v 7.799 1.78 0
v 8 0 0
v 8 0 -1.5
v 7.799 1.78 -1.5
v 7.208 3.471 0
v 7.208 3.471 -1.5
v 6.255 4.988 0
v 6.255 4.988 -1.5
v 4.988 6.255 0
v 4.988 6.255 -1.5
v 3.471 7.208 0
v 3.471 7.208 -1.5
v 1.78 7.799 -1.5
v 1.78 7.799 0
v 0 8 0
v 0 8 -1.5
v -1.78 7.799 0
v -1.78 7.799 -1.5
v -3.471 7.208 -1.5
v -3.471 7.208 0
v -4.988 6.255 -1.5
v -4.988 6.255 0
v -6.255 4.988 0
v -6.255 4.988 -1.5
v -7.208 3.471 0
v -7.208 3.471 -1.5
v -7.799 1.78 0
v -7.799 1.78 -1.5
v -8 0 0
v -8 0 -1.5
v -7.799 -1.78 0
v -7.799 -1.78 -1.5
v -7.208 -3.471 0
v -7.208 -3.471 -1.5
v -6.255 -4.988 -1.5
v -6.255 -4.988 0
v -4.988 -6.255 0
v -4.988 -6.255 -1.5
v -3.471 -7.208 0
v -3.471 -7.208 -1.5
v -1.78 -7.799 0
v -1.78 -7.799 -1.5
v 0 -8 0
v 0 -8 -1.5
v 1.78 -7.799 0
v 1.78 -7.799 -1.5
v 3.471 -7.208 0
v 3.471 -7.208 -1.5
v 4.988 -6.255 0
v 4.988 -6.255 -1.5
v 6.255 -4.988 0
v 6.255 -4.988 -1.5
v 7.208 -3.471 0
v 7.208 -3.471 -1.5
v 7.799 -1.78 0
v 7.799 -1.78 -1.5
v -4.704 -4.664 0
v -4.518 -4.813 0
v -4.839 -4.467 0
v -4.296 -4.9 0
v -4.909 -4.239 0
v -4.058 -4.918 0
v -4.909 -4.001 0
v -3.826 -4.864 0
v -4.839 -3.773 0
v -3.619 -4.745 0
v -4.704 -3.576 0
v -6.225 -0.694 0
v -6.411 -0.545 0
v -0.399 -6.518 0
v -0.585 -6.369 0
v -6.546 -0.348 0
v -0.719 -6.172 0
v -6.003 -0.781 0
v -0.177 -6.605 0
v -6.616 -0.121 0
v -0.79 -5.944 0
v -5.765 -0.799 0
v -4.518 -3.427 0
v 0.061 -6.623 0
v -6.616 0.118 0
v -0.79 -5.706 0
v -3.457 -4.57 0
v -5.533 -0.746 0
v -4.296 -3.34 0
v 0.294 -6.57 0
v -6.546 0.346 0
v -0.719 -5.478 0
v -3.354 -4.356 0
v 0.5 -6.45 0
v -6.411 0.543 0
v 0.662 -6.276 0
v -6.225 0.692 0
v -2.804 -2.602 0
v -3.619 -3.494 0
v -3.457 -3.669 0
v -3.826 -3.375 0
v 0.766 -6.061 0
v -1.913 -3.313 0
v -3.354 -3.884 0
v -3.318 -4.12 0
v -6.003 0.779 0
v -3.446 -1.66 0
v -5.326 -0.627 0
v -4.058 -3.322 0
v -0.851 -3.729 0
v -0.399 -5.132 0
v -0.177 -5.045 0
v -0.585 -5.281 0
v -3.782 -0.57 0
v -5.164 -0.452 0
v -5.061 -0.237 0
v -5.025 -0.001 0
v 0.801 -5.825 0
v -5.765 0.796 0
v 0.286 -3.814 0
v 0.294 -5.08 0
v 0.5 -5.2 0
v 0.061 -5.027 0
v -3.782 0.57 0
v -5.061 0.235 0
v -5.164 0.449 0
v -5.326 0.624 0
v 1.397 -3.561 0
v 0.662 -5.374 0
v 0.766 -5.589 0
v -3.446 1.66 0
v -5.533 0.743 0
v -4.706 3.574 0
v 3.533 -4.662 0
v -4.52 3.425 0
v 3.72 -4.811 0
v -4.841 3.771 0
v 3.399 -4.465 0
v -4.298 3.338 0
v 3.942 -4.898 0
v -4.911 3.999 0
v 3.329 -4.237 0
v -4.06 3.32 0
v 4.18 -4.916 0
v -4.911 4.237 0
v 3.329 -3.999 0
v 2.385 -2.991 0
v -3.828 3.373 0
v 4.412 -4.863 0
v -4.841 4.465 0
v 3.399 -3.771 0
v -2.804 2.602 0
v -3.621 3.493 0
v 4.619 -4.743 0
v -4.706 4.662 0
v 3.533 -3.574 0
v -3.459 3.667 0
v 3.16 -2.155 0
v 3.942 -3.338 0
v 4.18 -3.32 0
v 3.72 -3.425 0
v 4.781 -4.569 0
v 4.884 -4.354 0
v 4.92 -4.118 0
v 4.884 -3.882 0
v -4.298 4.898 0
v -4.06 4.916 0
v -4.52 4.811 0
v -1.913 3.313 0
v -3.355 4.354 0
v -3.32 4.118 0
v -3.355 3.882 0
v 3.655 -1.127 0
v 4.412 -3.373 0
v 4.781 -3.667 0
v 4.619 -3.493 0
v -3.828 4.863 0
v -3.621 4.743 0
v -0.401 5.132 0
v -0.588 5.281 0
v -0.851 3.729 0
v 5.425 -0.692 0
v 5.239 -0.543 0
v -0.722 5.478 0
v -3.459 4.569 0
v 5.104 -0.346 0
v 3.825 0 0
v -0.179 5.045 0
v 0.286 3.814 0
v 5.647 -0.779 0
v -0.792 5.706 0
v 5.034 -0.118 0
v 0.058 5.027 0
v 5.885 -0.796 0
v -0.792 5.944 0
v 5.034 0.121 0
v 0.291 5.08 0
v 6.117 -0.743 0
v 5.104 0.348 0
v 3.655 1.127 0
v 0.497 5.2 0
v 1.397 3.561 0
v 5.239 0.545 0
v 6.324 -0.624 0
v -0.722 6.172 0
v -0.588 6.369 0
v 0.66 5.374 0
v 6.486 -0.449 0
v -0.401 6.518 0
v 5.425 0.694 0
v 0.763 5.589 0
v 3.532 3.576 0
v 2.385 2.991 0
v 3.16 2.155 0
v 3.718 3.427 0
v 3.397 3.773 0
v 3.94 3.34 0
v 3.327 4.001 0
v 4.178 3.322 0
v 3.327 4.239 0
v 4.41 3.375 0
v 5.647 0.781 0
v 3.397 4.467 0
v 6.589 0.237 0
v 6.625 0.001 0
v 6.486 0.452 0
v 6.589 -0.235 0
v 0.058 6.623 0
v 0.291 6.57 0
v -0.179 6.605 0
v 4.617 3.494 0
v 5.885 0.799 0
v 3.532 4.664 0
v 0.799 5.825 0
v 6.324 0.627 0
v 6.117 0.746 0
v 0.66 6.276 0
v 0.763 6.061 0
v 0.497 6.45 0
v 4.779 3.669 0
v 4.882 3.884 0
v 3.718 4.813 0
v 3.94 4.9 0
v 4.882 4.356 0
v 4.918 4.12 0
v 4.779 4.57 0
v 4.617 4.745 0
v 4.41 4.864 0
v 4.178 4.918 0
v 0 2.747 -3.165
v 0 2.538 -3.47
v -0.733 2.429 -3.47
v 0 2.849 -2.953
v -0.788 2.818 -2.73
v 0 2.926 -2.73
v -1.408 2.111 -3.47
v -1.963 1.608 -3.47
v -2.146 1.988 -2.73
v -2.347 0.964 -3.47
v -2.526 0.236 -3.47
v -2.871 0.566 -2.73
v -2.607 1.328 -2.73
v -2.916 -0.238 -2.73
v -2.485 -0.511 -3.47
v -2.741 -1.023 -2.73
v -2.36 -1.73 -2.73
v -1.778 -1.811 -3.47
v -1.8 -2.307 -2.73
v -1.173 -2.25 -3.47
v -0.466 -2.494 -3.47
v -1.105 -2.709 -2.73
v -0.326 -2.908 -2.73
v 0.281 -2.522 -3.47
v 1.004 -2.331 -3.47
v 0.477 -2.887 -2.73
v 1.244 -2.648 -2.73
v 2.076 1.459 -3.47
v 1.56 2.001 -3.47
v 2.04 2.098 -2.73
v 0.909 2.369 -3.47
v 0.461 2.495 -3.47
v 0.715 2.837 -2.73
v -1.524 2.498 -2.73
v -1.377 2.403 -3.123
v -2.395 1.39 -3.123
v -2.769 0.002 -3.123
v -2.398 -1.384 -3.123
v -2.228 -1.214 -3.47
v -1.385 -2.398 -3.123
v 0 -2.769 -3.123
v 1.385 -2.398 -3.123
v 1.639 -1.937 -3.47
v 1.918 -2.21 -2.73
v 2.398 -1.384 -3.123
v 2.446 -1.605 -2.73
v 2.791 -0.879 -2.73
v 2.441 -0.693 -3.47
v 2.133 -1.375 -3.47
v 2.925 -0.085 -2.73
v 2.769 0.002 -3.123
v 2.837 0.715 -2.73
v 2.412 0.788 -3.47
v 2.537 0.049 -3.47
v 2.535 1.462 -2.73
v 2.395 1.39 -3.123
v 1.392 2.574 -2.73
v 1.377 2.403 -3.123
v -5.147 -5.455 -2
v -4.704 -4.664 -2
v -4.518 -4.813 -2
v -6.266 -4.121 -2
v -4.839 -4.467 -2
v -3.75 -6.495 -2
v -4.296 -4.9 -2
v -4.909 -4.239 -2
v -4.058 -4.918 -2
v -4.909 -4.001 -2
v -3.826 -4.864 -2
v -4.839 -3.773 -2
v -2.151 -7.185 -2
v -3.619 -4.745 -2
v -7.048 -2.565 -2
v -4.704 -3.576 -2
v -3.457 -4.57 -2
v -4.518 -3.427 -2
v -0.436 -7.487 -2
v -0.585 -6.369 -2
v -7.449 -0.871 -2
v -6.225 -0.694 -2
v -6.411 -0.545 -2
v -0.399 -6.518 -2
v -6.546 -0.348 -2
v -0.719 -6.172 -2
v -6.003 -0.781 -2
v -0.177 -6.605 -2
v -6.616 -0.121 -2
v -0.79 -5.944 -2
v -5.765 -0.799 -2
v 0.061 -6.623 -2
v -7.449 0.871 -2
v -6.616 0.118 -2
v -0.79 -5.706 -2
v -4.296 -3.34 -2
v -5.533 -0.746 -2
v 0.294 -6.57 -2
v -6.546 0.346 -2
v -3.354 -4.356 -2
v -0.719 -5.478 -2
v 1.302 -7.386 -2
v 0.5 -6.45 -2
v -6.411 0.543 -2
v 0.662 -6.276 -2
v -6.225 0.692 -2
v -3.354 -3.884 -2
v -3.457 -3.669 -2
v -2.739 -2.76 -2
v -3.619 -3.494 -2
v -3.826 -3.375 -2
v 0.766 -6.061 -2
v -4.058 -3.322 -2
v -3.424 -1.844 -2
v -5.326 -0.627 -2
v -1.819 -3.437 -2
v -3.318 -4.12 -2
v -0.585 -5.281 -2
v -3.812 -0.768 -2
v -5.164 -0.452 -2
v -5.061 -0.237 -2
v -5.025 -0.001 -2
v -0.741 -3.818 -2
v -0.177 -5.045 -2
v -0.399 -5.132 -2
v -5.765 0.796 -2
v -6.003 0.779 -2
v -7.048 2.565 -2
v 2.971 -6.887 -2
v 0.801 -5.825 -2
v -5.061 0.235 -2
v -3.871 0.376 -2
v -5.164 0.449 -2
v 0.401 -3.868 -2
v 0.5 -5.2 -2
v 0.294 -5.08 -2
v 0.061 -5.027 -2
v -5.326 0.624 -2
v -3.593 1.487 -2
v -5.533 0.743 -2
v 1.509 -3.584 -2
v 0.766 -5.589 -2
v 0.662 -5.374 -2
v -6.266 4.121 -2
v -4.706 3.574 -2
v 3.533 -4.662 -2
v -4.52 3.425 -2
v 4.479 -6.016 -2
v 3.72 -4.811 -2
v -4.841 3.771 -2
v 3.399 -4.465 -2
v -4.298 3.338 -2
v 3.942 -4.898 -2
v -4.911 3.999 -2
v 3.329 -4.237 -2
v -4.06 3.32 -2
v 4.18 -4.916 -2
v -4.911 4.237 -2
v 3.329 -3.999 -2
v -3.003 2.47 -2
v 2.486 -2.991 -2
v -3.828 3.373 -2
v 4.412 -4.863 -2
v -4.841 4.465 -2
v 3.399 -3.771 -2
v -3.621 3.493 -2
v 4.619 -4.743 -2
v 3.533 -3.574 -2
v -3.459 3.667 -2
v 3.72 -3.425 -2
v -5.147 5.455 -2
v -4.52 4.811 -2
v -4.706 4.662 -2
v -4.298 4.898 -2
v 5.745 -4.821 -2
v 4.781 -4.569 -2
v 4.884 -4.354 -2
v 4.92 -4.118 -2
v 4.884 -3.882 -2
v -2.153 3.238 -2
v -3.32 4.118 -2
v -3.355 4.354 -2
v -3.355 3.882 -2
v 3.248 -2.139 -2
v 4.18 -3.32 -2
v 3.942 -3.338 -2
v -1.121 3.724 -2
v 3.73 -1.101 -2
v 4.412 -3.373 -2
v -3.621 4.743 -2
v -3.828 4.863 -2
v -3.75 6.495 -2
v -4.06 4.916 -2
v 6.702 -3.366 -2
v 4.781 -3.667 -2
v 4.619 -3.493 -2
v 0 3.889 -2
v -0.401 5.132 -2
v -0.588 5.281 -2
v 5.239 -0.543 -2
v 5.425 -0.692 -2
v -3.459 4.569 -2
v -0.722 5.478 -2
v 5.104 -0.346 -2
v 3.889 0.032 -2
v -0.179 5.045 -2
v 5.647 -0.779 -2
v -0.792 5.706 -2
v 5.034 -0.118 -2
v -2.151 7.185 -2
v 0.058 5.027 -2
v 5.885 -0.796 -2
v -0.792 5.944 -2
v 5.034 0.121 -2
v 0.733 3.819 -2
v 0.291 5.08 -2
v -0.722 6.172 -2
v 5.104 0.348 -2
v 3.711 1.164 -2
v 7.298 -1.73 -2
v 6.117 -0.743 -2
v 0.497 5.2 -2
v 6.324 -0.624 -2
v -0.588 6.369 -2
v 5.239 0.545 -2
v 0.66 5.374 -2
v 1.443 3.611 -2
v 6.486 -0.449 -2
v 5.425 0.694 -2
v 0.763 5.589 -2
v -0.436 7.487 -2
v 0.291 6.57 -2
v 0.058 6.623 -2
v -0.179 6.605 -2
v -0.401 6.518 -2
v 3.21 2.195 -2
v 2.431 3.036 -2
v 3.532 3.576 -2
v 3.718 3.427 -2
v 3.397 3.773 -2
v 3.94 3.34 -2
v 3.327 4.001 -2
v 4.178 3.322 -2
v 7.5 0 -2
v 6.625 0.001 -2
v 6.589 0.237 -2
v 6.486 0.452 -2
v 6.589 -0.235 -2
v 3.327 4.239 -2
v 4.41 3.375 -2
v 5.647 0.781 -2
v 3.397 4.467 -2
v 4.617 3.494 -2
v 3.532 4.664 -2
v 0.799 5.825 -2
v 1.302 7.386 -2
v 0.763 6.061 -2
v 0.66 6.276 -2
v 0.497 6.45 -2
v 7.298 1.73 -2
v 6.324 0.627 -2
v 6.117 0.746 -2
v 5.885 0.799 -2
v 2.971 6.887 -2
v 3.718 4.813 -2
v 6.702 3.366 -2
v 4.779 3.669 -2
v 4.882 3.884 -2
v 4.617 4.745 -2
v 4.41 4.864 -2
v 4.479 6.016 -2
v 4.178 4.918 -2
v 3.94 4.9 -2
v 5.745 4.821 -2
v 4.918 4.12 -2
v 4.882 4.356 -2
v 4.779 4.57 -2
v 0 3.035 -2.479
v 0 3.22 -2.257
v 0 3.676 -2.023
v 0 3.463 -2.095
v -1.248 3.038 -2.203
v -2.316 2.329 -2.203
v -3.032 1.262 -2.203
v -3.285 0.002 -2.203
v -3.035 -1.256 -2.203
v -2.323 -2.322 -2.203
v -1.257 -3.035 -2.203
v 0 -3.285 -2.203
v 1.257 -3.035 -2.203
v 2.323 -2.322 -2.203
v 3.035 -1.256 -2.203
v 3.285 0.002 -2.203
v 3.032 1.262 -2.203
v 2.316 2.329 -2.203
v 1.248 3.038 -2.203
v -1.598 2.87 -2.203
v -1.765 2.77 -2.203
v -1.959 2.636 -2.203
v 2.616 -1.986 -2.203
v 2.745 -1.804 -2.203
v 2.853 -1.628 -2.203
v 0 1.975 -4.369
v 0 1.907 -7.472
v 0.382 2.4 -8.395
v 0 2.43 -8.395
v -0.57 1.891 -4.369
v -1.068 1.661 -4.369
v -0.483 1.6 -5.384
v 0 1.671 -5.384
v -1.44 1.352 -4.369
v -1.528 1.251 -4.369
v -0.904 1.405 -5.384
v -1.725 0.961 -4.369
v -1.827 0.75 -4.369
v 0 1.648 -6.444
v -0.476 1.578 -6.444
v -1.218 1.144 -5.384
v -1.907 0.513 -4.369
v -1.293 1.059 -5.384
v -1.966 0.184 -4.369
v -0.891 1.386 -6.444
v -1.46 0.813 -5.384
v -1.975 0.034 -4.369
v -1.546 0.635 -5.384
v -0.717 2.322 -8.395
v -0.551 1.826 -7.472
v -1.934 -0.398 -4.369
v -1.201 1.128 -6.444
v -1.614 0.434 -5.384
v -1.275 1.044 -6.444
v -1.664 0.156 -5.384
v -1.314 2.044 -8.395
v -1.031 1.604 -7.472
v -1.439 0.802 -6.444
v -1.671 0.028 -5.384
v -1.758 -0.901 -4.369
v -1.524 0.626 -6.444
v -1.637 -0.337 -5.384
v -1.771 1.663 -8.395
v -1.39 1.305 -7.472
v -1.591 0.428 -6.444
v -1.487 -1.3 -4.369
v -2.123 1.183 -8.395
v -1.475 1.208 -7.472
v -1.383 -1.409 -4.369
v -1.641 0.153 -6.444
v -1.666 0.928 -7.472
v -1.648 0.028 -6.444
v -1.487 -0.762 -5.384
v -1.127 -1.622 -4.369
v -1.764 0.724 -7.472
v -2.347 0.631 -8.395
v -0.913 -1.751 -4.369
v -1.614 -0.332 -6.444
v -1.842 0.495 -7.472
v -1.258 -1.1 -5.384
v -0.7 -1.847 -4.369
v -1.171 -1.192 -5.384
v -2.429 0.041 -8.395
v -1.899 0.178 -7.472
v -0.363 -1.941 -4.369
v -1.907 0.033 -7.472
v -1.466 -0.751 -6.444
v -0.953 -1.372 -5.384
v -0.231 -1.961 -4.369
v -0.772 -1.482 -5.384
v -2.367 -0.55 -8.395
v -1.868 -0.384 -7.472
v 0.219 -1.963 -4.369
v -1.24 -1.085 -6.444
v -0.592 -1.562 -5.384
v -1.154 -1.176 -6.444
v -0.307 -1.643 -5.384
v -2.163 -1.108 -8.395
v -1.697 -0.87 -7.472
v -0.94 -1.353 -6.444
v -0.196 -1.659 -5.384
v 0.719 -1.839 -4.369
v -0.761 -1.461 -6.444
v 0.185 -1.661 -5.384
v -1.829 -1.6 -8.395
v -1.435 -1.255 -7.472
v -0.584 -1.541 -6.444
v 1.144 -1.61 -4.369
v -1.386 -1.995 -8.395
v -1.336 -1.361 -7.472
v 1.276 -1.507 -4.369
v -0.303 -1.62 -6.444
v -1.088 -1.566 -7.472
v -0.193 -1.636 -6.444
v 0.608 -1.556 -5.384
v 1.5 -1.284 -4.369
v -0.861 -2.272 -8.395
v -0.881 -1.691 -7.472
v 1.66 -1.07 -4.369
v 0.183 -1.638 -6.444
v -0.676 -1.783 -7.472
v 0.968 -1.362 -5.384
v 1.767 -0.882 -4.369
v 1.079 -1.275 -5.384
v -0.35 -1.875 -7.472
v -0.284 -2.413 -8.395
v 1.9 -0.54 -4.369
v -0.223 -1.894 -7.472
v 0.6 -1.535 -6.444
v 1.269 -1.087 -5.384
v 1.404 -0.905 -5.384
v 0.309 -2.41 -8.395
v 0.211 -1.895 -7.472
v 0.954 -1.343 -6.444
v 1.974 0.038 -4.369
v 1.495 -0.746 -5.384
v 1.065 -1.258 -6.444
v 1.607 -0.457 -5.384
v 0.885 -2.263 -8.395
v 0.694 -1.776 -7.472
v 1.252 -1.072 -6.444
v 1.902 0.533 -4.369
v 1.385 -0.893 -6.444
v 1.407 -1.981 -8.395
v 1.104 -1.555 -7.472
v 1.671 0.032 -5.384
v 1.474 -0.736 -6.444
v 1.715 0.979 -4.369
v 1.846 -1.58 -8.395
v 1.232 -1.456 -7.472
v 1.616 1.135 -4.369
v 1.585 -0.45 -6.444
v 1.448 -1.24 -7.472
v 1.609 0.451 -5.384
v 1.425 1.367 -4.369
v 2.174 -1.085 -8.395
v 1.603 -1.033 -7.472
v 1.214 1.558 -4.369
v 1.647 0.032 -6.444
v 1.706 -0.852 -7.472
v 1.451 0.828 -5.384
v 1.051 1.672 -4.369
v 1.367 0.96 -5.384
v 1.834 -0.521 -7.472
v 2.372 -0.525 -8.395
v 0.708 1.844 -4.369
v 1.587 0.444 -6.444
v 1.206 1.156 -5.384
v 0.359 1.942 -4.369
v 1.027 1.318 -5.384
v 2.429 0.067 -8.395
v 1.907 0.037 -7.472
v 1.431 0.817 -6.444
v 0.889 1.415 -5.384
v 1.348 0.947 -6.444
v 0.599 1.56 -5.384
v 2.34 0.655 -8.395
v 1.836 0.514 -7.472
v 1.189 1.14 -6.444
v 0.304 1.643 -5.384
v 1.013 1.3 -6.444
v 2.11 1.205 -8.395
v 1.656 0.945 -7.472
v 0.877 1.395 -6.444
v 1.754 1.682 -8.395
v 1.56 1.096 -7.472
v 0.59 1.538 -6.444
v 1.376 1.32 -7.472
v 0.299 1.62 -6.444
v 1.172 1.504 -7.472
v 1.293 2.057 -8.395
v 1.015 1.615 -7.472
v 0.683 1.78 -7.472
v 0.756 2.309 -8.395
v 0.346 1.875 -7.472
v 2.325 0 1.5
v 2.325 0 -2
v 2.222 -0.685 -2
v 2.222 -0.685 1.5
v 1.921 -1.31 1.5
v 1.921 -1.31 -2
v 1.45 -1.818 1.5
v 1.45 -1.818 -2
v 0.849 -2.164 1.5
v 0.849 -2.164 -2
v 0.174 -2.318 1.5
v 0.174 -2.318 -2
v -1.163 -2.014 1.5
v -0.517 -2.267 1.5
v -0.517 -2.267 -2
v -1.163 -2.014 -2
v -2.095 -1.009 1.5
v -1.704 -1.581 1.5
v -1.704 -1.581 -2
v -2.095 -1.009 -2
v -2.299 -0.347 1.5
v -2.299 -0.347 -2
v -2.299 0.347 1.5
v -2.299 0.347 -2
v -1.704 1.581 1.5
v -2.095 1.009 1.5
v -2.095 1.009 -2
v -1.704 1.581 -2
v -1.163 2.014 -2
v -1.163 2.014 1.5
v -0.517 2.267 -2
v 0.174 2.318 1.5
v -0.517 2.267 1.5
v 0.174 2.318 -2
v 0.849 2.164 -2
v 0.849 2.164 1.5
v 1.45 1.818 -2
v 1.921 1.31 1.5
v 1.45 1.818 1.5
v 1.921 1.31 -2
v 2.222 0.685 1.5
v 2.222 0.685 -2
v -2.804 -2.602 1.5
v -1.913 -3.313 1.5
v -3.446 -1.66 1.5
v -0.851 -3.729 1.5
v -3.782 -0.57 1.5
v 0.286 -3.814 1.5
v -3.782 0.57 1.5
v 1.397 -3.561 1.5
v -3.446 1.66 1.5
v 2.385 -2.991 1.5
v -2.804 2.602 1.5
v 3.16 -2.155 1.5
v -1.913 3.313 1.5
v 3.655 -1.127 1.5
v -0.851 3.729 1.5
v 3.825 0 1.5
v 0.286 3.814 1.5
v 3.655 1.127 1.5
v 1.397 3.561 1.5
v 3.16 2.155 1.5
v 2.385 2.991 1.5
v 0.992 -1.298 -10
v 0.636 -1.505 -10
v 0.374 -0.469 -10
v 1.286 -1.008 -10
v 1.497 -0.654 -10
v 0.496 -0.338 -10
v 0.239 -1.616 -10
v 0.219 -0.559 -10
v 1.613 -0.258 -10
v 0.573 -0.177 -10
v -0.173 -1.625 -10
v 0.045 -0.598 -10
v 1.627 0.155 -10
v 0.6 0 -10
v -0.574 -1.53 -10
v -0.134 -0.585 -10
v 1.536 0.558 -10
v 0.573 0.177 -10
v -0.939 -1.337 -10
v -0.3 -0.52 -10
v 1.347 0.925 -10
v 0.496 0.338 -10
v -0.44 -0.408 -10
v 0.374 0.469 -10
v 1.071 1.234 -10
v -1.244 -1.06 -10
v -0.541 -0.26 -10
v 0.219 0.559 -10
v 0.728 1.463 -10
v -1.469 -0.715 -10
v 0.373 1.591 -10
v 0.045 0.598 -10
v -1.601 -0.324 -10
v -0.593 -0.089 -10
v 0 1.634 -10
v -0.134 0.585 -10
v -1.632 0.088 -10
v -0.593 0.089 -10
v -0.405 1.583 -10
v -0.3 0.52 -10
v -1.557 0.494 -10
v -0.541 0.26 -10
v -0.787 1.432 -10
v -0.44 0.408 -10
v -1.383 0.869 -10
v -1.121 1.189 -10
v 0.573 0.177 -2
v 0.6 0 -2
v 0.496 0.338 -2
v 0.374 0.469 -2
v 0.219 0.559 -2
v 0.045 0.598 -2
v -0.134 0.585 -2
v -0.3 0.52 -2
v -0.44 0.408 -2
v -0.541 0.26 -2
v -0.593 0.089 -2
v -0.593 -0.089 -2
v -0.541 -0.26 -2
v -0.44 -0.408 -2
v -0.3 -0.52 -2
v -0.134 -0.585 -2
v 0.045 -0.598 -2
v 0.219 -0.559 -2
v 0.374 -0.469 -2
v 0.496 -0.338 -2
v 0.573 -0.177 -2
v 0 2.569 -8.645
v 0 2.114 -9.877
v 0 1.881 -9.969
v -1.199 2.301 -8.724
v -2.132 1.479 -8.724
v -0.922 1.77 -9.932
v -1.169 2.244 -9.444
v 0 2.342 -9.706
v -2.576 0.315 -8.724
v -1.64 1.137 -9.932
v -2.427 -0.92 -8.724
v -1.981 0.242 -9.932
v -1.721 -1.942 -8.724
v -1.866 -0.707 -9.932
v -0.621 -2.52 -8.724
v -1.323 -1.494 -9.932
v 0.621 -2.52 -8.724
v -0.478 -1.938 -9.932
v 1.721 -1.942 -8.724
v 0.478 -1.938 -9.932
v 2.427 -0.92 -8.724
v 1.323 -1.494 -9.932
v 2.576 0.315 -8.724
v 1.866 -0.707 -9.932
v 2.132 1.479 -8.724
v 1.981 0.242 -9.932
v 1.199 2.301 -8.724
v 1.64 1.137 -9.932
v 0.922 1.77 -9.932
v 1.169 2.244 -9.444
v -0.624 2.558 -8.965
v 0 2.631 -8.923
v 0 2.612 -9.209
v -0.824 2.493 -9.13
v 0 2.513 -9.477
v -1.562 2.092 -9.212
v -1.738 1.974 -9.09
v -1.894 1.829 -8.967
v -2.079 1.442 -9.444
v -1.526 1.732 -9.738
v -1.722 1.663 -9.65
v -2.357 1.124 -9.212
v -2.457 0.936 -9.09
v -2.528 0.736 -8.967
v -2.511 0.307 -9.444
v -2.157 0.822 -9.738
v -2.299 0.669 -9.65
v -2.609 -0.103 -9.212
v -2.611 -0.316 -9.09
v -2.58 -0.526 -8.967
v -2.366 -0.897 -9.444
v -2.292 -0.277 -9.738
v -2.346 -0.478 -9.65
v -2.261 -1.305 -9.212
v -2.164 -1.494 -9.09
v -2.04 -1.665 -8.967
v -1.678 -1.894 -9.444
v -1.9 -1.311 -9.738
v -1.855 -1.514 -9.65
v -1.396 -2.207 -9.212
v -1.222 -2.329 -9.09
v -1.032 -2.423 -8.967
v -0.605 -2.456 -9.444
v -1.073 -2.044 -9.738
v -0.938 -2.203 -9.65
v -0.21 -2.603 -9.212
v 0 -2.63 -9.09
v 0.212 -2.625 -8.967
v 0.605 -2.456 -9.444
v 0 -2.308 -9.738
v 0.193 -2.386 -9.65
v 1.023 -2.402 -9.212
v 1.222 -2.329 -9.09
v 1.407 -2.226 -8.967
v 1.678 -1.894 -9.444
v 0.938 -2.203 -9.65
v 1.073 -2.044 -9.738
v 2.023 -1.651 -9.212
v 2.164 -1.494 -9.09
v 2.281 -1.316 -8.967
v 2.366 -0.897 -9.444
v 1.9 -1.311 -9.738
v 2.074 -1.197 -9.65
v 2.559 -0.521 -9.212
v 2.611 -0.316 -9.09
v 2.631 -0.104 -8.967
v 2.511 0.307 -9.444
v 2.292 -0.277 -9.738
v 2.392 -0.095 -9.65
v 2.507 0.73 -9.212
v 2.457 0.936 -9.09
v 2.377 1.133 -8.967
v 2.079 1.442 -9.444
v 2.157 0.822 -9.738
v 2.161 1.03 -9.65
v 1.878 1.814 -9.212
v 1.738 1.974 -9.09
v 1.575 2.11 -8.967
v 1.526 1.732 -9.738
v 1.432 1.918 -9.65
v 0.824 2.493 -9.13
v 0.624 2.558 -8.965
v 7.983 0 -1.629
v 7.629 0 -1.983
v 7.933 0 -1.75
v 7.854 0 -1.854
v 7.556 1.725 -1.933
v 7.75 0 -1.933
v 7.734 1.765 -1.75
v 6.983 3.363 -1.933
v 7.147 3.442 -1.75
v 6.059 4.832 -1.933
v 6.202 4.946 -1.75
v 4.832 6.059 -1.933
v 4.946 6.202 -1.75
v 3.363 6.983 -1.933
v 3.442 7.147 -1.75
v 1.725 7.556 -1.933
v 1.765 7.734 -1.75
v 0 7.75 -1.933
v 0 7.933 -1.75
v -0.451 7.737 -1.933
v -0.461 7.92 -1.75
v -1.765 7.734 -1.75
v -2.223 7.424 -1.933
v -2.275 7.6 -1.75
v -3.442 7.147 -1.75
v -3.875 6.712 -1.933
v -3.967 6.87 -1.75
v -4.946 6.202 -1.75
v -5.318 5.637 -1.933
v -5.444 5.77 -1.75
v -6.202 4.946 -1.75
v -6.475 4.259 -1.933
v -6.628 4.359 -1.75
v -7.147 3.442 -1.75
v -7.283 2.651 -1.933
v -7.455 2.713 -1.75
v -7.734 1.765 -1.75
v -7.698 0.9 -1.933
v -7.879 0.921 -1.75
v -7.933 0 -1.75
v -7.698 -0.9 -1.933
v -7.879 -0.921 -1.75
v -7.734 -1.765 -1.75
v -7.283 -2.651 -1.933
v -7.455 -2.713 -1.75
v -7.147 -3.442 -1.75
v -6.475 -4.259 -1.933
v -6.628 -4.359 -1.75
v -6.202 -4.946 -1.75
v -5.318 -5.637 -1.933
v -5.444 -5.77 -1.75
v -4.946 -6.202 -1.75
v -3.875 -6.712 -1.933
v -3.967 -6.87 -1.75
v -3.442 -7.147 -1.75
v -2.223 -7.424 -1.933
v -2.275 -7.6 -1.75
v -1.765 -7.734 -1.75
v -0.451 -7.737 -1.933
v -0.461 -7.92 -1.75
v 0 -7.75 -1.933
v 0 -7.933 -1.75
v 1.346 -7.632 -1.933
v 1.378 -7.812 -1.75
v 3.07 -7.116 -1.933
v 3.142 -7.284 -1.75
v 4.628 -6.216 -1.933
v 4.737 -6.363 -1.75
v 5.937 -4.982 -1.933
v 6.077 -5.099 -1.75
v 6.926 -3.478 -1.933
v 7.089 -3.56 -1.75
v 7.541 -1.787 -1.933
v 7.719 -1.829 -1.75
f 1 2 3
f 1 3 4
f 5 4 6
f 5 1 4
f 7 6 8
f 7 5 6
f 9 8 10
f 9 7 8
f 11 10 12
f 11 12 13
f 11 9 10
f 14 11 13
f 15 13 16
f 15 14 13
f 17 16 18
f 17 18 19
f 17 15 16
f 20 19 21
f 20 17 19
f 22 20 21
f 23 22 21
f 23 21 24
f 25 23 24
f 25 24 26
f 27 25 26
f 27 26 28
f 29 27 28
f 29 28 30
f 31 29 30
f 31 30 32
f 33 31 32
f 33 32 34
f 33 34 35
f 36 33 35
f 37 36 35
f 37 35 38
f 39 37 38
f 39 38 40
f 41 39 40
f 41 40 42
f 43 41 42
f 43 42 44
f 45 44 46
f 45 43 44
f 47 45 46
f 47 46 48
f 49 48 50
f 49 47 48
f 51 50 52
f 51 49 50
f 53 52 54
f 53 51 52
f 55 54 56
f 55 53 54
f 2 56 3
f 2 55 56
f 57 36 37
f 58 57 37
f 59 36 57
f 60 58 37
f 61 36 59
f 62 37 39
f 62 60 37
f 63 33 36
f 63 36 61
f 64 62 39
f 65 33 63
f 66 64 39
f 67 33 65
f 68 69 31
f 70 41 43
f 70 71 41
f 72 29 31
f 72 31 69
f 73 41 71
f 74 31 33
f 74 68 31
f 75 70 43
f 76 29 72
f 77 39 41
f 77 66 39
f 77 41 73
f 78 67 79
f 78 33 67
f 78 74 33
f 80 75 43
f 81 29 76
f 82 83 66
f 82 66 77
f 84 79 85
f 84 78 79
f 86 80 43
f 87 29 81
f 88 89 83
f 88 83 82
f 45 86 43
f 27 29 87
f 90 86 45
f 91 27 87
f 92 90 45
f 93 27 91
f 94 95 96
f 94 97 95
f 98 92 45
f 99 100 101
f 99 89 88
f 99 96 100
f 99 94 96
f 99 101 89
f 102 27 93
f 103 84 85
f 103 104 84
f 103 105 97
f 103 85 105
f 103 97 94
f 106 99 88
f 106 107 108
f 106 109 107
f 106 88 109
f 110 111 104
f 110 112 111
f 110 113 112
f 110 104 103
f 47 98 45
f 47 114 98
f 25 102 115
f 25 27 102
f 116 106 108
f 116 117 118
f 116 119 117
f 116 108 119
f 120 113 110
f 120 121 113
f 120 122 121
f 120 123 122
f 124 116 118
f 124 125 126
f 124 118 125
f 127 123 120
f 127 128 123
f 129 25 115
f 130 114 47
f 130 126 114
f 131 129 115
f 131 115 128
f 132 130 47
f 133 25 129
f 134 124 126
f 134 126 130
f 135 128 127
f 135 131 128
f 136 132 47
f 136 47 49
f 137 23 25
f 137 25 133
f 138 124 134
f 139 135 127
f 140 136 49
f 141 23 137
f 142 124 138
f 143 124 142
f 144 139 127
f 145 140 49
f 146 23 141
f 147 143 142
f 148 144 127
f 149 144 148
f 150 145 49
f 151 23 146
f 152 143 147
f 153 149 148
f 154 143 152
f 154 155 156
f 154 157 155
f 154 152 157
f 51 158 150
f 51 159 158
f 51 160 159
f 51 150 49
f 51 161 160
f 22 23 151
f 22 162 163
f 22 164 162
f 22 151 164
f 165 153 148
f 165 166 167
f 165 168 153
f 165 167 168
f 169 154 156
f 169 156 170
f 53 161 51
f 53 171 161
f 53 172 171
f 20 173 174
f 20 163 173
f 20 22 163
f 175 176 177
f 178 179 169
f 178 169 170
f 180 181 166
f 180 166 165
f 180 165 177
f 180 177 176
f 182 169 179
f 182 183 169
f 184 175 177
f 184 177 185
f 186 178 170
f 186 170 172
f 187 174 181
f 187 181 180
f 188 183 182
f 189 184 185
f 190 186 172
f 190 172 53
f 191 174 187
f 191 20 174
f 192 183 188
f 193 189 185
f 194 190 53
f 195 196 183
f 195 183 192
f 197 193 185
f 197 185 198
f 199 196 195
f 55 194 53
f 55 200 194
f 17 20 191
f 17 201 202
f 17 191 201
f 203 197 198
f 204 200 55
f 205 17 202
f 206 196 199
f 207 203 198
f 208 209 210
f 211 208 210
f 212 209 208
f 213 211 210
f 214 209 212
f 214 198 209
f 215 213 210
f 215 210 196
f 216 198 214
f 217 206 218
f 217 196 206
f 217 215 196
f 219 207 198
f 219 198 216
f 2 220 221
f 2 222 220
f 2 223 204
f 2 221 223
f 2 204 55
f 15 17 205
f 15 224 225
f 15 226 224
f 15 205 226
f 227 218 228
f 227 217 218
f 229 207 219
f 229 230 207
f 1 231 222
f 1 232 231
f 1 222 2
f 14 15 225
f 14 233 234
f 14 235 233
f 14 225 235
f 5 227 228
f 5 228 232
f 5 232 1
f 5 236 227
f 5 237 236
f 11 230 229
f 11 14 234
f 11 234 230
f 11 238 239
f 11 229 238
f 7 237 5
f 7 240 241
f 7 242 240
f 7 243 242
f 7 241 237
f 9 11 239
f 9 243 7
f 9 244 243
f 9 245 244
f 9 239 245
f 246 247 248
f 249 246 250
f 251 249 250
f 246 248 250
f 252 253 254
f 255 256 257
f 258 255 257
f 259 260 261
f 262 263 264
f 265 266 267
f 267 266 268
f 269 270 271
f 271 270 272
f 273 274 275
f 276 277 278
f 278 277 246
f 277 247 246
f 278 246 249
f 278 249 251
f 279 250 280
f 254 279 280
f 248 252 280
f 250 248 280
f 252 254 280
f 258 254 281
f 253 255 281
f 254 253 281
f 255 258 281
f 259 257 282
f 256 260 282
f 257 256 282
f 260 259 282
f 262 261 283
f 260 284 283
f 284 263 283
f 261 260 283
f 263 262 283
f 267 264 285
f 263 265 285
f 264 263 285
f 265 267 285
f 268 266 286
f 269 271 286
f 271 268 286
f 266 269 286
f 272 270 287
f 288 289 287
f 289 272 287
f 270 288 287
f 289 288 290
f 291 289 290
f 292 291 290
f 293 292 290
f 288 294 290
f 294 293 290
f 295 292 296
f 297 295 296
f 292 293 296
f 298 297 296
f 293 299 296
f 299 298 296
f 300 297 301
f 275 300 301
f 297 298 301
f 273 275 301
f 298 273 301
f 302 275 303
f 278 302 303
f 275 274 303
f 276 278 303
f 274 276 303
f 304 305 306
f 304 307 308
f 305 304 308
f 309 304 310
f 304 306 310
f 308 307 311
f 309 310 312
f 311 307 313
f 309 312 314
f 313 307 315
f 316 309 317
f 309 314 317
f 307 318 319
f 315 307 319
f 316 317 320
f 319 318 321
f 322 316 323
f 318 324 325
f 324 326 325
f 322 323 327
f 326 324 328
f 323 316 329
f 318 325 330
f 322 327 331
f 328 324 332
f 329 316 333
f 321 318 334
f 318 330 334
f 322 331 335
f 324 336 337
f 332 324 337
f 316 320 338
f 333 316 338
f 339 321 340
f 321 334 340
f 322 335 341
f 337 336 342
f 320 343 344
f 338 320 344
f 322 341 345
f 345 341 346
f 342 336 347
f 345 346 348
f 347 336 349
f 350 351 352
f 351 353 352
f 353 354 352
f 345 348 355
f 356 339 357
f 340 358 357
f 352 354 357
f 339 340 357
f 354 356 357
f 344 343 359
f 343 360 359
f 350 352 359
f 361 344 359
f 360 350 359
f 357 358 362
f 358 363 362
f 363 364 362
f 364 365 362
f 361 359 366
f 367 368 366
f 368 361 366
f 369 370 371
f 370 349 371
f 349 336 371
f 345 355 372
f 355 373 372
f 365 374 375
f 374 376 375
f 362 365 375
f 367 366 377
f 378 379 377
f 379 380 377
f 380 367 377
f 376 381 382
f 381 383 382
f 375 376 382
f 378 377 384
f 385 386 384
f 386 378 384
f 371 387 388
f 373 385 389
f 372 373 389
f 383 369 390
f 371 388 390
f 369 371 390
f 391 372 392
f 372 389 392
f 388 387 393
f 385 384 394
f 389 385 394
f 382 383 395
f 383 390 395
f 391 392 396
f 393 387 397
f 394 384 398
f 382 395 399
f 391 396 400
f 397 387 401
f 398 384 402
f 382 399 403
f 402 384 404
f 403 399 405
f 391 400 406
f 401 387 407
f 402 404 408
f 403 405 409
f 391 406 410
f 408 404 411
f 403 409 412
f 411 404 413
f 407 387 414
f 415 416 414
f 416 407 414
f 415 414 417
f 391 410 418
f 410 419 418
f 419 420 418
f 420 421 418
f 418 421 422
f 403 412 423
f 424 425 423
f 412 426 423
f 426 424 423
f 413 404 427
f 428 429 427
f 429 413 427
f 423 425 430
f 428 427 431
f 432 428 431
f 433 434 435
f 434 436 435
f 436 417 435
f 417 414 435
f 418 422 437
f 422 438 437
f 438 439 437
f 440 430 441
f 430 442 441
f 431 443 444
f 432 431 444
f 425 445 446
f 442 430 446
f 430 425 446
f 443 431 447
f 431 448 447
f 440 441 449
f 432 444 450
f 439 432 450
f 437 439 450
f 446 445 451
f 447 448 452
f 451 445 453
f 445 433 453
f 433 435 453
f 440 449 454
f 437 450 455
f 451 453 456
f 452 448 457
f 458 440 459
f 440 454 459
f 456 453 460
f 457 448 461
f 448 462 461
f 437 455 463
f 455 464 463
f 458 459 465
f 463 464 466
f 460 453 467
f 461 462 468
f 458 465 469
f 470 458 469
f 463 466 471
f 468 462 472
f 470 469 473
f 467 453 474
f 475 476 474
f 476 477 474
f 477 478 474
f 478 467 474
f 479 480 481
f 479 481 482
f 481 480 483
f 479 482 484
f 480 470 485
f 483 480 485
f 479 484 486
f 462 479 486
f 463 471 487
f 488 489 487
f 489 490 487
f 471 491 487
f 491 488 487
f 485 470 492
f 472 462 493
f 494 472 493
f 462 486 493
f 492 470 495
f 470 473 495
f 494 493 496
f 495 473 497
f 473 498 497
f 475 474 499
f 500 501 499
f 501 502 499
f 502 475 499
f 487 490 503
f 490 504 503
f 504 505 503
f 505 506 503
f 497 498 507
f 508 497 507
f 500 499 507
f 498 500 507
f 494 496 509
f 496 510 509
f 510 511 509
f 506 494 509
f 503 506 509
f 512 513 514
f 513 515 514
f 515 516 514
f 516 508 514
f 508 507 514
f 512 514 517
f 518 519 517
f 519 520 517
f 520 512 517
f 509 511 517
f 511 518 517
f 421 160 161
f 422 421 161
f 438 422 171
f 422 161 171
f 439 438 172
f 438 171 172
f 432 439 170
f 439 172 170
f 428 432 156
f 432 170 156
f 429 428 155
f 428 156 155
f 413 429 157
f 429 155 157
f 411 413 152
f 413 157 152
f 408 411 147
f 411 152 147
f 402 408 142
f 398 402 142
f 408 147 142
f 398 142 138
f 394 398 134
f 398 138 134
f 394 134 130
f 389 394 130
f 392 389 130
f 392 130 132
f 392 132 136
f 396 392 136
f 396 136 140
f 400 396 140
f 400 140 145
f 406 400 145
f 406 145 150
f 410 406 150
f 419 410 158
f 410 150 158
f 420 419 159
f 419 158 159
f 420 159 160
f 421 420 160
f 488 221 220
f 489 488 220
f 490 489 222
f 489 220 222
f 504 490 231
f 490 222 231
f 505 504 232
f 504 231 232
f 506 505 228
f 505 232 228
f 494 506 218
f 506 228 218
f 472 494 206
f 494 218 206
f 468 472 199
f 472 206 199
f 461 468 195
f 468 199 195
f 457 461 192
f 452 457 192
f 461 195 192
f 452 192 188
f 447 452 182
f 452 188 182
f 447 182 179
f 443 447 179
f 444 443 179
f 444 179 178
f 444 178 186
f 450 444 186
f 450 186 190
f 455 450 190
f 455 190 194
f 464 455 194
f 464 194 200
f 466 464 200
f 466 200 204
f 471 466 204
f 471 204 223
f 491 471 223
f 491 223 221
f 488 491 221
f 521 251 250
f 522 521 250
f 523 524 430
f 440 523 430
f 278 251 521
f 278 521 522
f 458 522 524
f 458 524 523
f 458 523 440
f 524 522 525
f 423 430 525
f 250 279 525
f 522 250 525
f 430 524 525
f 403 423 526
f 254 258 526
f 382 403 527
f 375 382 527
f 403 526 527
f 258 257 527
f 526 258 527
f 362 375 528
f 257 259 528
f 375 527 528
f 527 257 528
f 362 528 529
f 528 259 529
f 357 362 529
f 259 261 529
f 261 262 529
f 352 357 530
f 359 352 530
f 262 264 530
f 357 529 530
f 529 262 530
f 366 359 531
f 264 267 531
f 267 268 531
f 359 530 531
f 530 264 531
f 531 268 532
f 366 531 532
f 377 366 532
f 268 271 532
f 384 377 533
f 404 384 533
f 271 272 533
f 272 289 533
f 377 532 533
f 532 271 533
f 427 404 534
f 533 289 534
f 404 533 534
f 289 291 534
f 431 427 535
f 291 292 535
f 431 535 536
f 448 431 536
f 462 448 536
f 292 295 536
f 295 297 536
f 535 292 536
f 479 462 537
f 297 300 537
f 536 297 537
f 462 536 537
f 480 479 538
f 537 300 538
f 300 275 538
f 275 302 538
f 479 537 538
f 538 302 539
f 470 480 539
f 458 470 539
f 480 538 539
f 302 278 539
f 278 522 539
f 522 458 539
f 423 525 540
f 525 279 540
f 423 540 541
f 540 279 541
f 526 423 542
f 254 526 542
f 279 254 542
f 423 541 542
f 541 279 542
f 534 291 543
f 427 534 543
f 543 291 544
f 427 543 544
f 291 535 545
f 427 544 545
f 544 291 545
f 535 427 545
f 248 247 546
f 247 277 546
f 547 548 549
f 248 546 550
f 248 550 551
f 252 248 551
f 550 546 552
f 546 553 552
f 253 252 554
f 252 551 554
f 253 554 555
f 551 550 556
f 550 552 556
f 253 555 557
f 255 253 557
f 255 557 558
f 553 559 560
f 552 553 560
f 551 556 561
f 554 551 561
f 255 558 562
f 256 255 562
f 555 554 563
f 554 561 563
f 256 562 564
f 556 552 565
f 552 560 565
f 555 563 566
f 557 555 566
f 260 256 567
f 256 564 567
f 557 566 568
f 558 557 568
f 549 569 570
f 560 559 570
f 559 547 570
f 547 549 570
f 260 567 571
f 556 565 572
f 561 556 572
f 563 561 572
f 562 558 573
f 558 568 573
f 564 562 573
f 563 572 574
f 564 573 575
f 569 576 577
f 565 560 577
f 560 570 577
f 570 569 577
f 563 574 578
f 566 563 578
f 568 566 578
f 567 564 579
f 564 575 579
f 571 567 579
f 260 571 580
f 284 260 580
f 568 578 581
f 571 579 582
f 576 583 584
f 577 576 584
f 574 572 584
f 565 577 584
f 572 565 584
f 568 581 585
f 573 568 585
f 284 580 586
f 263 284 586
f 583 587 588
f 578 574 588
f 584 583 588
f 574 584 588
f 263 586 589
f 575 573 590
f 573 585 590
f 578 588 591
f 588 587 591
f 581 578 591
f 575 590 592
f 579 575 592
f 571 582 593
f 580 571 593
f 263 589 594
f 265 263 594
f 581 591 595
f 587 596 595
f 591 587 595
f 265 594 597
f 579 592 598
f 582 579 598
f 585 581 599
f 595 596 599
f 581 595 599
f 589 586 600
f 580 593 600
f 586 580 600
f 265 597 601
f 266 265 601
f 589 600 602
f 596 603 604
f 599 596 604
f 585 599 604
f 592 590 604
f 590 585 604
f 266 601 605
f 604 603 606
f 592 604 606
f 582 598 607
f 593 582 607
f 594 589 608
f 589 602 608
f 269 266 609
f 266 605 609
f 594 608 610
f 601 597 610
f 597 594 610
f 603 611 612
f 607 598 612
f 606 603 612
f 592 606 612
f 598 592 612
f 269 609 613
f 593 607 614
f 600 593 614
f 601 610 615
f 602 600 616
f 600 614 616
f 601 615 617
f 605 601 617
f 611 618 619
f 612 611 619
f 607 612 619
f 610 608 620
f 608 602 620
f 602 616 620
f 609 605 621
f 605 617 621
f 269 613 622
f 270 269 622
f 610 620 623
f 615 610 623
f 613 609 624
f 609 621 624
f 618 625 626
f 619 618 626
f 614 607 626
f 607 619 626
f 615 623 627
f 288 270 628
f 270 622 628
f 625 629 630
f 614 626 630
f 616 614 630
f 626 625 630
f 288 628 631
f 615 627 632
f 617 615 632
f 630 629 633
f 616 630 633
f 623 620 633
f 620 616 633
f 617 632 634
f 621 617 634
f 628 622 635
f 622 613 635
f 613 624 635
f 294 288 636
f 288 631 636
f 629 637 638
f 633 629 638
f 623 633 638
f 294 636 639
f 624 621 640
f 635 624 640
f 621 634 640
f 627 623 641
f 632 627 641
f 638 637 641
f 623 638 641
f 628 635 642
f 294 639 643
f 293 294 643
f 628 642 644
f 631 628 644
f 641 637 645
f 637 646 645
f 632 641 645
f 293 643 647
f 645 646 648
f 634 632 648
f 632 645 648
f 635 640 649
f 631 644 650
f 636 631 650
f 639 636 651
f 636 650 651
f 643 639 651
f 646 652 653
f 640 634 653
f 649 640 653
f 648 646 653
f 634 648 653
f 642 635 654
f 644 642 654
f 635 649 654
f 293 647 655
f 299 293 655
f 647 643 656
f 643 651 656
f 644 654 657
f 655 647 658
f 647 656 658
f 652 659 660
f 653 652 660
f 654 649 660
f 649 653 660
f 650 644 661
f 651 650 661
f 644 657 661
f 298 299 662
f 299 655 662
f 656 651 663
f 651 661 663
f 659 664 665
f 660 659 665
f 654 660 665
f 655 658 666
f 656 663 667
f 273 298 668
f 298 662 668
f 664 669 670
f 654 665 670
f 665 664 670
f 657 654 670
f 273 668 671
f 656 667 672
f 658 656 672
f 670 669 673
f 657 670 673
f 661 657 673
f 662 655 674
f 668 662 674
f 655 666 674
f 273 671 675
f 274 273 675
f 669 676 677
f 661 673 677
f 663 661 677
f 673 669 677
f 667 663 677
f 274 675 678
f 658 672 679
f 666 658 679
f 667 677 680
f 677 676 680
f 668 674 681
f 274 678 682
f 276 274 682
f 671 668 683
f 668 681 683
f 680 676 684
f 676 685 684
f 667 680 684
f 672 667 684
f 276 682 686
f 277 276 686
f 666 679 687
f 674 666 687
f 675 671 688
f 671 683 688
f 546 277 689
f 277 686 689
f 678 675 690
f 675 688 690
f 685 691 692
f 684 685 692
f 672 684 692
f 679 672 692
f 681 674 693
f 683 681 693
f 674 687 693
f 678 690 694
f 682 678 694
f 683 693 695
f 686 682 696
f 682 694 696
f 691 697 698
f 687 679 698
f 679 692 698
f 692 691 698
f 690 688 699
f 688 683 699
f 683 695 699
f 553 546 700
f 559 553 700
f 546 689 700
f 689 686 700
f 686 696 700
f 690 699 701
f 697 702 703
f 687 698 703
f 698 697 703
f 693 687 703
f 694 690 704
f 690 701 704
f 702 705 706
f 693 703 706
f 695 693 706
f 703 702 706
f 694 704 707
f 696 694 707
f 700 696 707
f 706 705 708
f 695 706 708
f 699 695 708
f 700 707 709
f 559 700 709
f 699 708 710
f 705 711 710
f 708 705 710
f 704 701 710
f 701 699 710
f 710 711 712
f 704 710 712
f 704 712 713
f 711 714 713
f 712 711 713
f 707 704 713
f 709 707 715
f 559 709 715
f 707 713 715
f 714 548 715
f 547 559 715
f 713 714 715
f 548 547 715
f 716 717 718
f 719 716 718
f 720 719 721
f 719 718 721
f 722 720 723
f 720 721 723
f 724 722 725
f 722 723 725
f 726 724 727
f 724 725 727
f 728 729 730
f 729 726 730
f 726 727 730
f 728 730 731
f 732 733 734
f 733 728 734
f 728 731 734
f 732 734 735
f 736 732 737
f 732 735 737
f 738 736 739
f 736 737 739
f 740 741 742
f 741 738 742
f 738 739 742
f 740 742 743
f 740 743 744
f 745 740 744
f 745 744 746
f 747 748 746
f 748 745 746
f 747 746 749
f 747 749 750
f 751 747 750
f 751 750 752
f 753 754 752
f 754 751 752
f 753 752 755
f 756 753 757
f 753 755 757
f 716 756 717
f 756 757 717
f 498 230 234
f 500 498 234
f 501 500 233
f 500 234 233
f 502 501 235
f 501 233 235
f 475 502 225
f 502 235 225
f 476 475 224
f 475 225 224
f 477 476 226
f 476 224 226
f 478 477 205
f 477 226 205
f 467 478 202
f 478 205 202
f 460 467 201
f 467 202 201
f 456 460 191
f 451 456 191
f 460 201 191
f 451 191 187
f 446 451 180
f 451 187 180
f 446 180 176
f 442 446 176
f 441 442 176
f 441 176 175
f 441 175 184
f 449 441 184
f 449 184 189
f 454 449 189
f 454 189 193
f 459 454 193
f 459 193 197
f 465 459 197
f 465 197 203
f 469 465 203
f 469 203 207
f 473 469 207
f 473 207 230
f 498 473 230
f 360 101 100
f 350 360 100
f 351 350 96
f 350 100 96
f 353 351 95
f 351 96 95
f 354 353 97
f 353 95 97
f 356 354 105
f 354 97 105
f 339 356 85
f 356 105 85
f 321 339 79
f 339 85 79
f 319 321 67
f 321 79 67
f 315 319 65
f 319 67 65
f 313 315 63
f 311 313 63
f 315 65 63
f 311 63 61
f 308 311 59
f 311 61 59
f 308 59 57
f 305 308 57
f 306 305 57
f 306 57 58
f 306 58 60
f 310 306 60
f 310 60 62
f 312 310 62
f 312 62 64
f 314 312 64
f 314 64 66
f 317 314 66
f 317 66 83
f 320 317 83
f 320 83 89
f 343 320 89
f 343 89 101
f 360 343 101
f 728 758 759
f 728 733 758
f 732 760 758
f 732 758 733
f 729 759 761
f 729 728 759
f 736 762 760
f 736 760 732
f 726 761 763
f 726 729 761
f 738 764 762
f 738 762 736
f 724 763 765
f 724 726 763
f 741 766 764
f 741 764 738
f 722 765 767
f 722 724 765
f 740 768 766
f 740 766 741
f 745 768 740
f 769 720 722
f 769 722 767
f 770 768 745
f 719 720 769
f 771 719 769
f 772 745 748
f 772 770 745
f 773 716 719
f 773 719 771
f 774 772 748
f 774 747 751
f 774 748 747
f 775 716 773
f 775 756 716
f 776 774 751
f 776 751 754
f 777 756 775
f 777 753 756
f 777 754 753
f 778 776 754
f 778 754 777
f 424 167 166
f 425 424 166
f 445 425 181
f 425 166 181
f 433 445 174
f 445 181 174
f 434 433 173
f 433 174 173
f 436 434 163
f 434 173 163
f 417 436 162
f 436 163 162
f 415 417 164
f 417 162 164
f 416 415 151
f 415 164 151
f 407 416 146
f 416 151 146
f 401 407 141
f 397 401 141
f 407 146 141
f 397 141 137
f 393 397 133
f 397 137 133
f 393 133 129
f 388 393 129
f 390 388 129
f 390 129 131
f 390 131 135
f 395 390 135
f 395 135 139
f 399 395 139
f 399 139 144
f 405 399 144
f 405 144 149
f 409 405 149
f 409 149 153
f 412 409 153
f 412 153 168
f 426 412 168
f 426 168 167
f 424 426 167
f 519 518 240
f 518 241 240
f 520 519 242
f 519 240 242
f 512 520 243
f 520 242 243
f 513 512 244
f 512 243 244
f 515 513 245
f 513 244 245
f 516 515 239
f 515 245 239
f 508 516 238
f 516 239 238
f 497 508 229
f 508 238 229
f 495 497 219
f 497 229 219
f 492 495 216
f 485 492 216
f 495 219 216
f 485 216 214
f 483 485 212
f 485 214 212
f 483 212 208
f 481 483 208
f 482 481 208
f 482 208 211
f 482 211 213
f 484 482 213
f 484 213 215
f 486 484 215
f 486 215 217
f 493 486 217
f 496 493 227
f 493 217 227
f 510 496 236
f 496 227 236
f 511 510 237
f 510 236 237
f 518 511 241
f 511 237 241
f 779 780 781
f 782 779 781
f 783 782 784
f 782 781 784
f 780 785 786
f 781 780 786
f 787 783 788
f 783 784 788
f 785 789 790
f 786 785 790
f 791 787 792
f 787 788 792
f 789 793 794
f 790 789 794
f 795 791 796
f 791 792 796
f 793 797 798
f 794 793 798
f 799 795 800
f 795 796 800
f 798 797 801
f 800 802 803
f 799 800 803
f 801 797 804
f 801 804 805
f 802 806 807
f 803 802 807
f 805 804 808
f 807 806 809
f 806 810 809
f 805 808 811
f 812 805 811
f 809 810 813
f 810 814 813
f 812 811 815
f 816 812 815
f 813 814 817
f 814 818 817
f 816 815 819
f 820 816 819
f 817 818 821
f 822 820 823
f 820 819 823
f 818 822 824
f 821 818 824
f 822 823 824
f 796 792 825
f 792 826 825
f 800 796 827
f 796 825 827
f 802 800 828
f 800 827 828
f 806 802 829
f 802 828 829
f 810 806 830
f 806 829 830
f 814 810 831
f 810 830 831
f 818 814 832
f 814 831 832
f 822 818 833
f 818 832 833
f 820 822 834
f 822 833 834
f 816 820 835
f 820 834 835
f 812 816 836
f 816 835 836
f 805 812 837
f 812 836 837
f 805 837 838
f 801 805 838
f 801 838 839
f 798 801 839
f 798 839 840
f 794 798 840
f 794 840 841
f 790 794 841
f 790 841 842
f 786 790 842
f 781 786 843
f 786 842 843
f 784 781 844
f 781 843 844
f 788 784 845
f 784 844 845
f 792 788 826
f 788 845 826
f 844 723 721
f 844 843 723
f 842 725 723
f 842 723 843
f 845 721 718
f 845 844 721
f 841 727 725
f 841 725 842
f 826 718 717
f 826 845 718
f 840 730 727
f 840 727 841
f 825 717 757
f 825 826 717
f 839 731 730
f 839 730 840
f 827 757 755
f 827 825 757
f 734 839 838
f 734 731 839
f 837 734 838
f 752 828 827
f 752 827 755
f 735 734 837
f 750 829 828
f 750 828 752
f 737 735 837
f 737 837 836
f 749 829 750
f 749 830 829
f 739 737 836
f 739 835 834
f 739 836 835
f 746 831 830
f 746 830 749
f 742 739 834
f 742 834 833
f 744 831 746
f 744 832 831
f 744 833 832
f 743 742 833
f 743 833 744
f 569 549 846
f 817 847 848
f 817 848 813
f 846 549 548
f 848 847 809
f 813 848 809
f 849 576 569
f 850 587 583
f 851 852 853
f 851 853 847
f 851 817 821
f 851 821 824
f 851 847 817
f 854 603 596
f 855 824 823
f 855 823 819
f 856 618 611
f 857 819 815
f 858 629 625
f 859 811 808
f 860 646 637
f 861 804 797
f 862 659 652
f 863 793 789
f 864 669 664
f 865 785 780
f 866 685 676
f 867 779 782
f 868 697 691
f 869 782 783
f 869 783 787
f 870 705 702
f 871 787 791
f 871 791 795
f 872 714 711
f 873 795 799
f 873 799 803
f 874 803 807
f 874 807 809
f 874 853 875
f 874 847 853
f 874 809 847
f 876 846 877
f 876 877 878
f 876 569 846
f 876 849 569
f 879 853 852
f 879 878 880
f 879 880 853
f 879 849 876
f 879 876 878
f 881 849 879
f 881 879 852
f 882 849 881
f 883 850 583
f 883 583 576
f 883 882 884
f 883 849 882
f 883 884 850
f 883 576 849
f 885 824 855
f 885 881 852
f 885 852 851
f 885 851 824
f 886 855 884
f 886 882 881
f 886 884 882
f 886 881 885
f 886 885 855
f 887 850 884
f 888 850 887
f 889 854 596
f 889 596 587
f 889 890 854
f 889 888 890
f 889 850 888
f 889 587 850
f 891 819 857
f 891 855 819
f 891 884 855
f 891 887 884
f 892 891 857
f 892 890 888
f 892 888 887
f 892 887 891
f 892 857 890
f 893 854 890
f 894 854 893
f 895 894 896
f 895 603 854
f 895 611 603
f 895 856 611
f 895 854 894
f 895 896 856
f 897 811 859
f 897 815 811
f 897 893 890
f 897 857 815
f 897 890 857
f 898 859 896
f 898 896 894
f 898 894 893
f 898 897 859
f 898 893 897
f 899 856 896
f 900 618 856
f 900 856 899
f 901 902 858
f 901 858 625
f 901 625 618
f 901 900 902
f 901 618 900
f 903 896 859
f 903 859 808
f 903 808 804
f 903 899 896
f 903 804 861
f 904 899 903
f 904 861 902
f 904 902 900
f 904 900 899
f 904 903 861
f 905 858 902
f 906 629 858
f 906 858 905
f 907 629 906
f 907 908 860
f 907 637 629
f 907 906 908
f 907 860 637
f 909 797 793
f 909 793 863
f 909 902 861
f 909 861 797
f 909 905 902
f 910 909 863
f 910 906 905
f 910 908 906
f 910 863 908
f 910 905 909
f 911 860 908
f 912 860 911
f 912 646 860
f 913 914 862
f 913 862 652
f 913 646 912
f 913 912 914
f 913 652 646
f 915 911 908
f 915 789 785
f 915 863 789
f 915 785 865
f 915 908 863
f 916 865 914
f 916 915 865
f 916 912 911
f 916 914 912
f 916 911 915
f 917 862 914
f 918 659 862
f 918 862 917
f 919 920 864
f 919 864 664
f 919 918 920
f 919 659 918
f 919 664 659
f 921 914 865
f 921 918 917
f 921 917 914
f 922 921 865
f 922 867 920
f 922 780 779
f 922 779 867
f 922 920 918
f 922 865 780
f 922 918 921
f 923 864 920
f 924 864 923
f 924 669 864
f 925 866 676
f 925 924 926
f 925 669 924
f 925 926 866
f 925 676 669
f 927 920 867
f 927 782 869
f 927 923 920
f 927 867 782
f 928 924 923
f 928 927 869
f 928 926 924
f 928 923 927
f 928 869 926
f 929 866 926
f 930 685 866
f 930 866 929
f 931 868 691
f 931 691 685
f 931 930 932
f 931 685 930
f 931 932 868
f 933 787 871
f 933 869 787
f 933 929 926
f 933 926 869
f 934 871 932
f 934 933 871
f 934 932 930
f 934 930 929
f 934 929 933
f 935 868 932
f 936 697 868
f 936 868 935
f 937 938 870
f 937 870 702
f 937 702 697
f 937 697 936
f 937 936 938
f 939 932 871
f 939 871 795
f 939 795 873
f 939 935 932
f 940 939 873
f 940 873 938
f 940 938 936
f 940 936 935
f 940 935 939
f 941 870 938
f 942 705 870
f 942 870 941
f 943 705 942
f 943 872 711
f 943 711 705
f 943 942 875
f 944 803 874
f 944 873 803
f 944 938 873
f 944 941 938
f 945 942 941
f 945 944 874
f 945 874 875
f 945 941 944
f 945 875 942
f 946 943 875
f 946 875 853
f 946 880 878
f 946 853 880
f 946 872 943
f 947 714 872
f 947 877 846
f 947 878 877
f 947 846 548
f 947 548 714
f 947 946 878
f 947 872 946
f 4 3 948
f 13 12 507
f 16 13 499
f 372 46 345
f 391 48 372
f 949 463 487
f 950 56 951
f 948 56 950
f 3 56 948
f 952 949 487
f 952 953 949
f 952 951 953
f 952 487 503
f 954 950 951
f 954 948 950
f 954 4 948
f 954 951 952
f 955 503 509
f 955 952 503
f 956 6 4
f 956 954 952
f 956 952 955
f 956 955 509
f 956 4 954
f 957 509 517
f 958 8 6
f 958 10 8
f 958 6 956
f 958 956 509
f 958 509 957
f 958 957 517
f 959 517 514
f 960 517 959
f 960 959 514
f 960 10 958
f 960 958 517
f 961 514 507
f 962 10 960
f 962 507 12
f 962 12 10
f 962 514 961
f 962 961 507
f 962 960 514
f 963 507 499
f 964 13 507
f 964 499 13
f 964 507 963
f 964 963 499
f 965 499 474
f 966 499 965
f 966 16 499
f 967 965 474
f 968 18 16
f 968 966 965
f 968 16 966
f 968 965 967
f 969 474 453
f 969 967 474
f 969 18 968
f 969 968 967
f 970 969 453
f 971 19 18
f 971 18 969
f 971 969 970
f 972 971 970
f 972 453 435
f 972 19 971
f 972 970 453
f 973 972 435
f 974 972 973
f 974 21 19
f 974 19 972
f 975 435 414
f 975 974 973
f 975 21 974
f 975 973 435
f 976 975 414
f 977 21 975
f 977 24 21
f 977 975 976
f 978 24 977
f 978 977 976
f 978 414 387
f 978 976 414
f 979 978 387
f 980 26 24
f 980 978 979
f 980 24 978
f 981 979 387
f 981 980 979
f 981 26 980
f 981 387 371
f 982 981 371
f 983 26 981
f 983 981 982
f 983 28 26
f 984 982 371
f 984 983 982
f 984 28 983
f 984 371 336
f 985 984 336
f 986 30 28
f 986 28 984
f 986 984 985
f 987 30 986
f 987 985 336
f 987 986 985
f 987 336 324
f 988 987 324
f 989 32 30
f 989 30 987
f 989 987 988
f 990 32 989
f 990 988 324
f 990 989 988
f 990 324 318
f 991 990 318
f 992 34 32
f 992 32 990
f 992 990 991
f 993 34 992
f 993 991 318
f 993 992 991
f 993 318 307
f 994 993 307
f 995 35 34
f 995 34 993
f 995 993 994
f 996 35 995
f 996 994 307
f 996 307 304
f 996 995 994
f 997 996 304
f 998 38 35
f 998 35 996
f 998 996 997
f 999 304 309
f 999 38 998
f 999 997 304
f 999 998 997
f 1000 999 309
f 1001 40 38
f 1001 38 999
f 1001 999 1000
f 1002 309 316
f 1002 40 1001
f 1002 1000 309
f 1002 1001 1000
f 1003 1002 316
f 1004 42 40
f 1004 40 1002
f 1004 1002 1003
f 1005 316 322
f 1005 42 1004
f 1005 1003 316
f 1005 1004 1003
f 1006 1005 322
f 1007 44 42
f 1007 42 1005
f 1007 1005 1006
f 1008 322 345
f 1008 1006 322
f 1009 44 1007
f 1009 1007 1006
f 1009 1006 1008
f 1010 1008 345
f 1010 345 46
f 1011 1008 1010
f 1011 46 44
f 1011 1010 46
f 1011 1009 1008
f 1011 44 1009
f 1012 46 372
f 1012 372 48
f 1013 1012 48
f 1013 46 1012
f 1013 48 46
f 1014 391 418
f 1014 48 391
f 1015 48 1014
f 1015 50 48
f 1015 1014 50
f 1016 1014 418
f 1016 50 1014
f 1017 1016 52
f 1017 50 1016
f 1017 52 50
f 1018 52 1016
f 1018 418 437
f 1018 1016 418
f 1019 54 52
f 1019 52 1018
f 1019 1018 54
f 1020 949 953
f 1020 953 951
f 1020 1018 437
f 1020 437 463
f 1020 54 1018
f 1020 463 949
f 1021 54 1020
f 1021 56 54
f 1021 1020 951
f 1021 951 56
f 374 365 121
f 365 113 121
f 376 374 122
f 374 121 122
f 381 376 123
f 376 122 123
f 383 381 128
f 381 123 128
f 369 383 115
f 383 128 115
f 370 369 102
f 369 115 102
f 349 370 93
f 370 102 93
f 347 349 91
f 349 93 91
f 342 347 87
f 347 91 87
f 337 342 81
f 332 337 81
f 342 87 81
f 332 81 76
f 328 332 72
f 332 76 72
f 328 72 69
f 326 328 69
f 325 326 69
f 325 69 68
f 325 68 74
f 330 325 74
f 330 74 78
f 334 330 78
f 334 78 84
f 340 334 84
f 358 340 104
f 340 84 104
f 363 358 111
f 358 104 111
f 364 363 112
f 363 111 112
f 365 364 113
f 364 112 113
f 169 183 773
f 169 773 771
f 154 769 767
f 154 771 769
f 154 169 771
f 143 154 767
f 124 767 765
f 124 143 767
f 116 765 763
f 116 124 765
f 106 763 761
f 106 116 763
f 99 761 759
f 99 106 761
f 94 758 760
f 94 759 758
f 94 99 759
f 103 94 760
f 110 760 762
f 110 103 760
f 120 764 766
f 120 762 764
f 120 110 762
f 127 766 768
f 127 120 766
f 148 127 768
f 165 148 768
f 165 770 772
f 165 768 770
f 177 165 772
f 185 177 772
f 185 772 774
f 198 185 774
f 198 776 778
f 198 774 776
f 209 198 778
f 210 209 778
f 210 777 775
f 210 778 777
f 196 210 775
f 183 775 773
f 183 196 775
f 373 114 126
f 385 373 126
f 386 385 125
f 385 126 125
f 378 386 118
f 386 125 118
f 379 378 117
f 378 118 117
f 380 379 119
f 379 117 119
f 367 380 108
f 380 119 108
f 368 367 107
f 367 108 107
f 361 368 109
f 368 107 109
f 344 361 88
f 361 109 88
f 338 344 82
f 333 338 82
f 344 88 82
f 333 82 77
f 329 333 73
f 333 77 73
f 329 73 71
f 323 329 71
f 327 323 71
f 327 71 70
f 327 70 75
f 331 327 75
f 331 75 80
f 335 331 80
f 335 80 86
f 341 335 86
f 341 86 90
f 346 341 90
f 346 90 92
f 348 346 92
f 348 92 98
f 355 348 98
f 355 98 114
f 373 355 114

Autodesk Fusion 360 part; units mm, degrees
sketch "Sketch1" plane through (0, 0, 0) normal (0, 0, 1) x (1, 0, 0)
  circle A0 centre (0, 0) radius 0.6
  circle A1 centre (0, 0) radius 8
  circle A2 centre (0, 0) radius 2.325
  circle A3 centre (0, 0) radius 3.825
  line L0 (3.825, 0.0013) -> (5.825, 0.0013) construction
  circle A4 centre (5.825, 0.0013) radius 0.8
  circle A5 centre (4.118, 4.1198) radius 0.8
  circle A6 centre (-0.0013, 5.825) radius 0.8
  circle A7 centre (-4.1198, 4.118) radius 0.8
  circle A8 centre (-5.825, -0.0013) radius 0.8
  circle A9 centre (-4.118, -4.1198) radius 0.8
  circle A10 centre (0.0013, -5.825) radius 0.8
  circle A11 centre (4.1198, -4.118) radius 0.8
  dimension "d1" = 1.2
  dimension "d2" = 16
  dimension "d3" = 4.65
  dimension "d4" = 7.65
  dimension "d5" = 2
  dimension "d6" = 1.6
  dimension "d8" = 360
extrude "Extrude1" add sketch "Sketch1" against normal blind 2 contours A1 | A3
extrude "Extrude2" add sketch "Sketch1" along normal blind 1.5 contours A3
sketch "Sketch2" plane through (0, 0, 0) normal (1, 0, 0) x (0, 1, 0)
  line L0 (0, 0) -> (0, -10)
  line L1 (0, -10) -> (3, -10)
  line L2 (0, -2) -> (3, -2)
  line L3 (3, -10) -> (3, -9)
  line L4 (3, -2) -> (3, -3)
  arc A0 (3, -3) -> (3, -9) centre (5.5787, -6) ccw
  dimension "d13" = 10
  dimension "d14" = 3
  dimension "d24" = 1
  dimension "d25" = 1
revolve "Revolve2" add sketch "Sketch2" angle 360 about axis through (0, 0, 1.75) along (0, 0, 1)
fillet "Fillet4" radius 2 1 edges at (-2.797, 1.0848, -9)
fillet "Fillet5" radius 2 1 edges at (-2.797, 1.0848, -3)
fillet "Fillet6" radius 1 1 edges at (-2.797, 1.0848, -10)
extrude "Extrude3" cut sketch "Sketch1" against normal blind 11 contours A0
fillet "Fillet8" radius 1 1 edges at (1.0848, -2.797, -2)
fillet "Fillet9" radius 0.5 1 edges at (-7.4586, 2.8929, -2)
revolve "Revolve1" [suppressed]
fillet "Fillet1" [suppressed]
fillet "Fillet2" [suppressed]
fillet "Fillet3" [suppressed]
